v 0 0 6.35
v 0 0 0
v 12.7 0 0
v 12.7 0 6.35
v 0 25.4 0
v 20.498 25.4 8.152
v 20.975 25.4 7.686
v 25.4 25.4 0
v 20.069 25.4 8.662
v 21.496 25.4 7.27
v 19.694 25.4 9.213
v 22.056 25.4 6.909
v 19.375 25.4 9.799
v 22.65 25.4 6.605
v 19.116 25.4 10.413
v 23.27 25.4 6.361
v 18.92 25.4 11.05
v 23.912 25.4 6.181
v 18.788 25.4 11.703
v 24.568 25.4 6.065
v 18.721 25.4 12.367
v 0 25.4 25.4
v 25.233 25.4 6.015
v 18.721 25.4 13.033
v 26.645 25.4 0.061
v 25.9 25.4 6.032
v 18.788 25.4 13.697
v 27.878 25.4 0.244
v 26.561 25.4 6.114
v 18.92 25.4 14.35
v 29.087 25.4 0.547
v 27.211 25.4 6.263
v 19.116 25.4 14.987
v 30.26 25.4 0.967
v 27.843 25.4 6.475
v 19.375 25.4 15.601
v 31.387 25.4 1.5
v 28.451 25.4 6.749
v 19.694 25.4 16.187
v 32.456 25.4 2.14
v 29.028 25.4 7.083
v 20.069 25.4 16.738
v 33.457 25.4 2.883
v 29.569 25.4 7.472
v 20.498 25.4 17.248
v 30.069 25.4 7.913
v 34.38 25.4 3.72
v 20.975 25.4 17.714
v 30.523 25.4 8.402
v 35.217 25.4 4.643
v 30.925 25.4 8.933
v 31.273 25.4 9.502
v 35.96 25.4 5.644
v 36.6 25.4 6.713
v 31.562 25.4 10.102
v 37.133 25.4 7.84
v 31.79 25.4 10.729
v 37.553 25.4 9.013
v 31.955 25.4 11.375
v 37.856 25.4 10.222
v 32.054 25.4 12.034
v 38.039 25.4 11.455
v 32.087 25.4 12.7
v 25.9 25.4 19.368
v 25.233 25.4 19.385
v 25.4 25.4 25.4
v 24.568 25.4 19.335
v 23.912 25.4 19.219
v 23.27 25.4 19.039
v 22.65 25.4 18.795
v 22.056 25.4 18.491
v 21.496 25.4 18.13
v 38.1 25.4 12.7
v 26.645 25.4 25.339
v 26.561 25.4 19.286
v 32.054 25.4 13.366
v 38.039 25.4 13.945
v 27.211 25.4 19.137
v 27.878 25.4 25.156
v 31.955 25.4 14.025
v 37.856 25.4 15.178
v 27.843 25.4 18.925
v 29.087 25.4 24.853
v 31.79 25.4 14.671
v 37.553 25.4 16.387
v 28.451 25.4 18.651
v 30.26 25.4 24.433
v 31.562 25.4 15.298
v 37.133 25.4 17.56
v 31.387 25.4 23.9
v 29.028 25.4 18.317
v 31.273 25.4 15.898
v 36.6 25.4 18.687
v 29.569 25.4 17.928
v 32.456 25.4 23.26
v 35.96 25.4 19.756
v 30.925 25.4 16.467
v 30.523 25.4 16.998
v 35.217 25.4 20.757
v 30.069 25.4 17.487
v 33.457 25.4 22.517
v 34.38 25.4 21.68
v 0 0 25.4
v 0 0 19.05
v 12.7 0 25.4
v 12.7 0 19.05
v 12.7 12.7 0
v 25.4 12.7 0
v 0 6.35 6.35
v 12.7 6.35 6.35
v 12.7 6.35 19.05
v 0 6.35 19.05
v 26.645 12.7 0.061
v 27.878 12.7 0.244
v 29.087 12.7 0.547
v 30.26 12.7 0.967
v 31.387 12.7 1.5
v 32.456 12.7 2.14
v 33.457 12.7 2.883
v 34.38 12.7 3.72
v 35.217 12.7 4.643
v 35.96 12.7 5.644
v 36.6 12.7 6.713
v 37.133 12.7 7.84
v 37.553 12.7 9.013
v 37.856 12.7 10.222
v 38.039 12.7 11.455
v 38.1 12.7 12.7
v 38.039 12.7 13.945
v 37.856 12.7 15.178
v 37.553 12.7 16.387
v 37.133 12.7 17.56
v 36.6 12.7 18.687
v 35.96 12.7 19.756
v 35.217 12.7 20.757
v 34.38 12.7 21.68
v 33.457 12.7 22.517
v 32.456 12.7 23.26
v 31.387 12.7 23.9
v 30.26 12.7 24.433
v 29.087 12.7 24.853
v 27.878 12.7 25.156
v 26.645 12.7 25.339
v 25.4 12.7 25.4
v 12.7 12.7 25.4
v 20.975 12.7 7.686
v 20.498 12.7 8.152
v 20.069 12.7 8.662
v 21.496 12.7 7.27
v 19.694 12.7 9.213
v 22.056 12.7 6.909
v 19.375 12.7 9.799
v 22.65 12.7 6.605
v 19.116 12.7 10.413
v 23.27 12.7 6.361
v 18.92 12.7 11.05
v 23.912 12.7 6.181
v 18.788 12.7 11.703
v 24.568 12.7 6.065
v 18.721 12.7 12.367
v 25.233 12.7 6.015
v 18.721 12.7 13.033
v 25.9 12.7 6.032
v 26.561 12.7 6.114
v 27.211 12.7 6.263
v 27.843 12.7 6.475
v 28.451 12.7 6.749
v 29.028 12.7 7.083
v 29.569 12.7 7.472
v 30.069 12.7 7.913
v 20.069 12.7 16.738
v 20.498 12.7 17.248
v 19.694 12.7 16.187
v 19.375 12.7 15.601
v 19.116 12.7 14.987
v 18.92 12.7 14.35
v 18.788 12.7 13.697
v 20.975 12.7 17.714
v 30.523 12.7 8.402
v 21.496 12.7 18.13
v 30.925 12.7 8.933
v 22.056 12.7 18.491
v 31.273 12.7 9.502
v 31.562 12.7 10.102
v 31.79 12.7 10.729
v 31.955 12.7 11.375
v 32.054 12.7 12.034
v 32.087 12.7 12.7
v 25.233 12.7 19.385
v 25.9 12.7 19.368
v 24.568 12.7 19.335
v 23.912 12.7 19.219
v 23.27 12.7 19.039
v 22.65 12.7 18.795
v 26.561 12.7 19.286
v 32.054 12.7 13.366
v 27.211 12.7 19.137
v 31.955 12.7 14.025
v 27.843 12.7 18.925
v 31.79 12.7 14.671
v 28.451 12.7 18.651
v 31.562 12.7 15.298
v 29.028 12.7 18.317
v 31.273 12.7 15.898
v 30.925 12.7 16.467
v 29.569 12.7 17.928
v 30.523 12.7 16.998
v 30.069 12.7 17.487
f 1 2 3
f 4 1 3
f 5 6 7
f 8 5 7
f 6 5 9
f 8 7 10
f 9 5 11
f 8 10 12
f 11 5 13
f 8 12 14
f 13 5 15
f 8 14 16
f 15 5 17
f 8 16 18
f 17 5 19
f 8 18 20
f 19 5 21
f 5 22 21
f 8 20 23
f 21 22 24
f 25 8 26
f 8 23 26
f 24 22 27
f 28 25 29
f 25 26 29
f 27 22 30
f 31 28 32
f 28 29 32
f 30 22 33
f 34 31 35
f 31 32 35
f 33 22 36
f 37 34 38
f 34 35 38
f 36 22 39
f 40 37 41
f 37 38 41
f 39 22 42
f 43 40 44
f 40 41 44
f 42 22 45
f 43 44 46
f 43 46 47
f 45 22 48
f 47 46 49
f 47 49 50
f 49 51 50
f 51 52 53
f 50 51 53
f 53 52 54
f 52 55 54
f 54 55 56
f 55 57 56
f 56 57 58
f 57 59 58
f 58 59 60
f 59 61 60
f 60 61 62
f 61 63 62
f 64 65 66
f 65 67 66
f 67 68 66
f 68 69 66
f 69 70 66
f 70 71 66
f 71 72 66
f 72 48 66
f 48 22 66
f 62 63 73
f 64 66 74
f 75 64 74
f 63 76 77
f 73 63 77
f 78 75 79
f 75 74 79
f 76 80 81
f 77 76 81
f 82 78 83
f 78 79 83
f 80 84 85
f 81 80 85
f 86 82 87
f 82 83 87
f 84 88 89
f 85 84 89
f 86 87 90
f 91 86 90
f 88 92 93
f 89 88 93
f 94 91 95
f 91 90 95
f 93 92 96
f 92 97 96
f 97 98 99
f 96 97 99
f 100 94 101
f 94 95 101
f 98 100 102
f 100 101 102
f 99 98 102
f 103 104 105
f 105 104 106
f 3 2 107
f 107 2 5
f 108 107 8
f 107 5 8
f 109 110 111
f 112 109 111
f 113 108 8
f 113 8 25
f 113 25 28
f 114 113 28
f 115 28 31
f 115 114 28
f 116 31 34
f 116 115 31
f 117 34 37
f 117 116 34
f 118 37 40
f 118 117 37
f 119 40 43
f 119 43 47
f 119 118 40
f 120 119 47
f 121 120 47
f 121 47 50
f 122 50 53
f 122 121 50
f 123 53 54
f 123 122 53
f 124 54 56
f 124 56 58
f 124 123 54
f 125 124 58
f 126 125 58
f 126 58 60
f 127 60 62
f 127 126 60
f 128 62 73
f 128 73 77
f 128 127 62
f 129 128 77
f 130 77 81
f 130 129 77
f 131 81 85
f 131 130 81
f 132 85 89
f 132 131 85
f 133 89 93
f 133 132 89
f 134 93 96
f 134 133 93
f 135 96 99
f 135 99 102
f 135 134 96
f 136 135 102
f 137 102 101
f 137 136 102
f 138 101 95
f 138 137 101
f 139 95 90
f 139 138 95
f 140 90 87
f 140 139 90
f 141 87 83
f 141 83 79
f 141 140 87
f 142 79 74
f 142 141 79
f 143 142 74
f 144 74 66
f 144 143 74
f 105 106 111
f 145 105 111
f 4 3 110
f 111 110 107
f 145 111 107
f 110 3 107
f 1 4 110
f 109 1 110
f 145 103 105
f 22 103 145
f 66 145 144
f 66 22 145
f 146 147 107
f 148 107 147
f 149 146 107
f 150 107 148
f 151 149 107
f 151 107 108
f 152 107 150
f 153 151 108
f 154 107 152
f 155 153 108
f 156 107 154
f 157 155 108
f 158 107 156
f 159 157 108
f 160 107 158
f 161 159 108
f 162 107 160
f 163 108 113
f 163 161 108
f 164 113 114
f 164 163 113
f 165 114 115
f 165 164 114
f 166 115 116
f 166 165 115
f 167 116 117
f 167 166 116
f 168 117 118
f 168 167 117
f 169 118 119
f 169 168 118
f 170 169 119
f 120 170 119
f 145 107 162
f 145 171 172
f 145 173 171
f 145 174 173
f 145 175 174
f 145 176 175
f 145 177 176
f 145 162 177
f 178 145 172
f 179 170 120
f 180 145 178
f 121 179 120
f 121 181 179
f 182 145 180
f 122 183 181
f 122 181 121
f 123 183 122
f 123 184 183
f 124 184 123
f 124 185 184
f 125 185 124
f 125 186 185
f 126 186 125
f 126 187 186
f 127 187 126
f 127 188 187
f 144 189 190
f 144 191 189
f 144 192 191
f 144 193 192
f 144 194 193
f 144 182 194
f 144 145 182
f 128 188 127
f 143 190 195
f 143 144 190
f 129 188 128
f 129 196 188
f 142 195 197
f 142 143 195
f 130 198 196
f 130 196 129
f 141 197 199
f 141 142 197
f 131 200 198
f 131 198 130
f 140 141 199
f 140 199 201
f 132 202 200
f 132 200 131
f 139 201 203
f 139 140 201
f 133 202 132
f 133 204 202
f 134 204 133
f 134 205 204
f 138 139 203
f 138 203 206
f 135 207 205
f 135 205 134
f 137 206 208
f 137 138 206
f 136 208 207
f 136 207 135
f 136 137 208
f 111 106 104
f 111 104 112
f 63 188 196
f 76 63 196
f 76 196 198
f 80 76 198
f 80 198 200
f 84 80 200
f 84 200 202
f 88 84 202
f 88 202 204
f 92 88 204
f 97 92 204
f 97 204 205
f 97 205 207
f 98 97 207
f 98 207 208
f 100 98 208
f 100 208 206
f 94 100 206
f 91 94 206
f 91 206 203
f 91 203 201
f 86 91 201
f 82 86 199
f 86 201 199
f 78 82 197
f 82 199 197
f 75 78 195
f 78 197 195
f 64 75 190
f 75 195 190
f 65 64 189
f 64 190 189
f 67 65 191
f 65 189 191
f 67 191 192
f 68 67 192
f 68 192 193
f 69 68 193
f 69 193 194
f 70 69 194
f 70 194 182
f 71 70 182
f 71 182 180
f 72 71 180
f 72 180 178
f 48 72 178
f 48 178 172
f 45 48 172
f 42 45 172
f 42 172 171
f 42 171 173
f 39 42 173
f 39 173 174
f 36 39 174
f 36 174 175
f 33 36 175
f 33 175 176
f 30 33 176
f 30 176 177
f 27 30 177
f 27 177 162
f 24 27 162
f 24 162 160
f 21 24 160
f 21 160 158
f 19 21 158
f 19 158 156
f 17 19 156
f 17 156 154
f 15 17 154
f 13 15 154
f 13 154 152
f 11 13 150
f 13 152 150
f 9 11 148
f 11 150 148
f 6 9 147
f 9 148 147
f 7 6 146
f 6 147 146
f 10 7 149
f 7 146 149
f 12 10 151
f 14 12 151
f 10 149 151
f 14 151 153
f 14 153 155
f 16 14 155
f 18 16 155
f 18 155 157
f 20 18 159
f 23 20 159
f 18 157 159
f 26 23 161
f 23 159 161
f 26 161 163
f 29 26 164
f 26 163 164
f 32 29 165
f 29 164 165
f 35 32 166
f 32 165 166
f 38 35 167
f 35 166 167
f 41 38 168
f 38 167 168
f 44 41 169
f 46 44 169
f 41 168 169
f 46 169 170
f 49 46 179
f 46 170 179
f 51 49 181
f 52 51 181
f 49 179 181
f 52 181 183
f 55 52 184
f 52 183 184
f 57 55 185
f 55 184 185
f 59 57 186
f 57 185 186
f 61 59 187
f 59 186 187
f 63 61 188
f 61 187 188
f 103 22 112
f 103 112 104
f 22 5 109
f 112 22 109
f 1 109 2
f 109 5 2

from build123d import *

# Parameters (mm, degrees)
F1_DEPTH = 25.4
F2_W     = 6.35
F2_H     = 12.7
F3_DEPTH = 25.4
F5_DEPTH = 12.7
F6_R     = 6.68714
F7_DEPTH = 25.4


with BuildPart() as f1:
    # F0 (on Top) → F1 (new body)
    with BuildSketch(Plane.XY):
        Polygon((0, 25.4), (0, 0), (12.7, 0), (12.7, 12.7), (25.4, 12.7), (25.4, 25.4), align=None)
    extrude(amount=F1_DEPTH)

    # F2 (on face) → F3 (cut)
    with BuildSketch(Plane.YZ.offset(12.7)):
        with Locations((3.175, 12.7)):
            Rectangle(F2_W, F2_H)
    extrude(amount=-F3_DEPTH, mode=Mode.SUBTRACT)

    # F4 (on face) → F5 (join)
    with BuildSketch(Plane.XZ.offset(-12.7)):
        with BuildLine():
            Line((25.4, 25.4), (25.4, 0))
            ThreePointArc((25.4, 0), (38.1, 12.7), (25.4, 25.4))
        make_face()
    extrude(amount=-F5_DEPTH)

    # F6 (on face) → F7 (cut)
    with BuildSketch(Plane.XZ.offset(-12.7)):
        with Locations((25.4, 12.7)):
            Circle(F6_R)
    extrude(amount=-F7_DEPTH, mode=Mode.SUBTRACT)


solid = f1.part
